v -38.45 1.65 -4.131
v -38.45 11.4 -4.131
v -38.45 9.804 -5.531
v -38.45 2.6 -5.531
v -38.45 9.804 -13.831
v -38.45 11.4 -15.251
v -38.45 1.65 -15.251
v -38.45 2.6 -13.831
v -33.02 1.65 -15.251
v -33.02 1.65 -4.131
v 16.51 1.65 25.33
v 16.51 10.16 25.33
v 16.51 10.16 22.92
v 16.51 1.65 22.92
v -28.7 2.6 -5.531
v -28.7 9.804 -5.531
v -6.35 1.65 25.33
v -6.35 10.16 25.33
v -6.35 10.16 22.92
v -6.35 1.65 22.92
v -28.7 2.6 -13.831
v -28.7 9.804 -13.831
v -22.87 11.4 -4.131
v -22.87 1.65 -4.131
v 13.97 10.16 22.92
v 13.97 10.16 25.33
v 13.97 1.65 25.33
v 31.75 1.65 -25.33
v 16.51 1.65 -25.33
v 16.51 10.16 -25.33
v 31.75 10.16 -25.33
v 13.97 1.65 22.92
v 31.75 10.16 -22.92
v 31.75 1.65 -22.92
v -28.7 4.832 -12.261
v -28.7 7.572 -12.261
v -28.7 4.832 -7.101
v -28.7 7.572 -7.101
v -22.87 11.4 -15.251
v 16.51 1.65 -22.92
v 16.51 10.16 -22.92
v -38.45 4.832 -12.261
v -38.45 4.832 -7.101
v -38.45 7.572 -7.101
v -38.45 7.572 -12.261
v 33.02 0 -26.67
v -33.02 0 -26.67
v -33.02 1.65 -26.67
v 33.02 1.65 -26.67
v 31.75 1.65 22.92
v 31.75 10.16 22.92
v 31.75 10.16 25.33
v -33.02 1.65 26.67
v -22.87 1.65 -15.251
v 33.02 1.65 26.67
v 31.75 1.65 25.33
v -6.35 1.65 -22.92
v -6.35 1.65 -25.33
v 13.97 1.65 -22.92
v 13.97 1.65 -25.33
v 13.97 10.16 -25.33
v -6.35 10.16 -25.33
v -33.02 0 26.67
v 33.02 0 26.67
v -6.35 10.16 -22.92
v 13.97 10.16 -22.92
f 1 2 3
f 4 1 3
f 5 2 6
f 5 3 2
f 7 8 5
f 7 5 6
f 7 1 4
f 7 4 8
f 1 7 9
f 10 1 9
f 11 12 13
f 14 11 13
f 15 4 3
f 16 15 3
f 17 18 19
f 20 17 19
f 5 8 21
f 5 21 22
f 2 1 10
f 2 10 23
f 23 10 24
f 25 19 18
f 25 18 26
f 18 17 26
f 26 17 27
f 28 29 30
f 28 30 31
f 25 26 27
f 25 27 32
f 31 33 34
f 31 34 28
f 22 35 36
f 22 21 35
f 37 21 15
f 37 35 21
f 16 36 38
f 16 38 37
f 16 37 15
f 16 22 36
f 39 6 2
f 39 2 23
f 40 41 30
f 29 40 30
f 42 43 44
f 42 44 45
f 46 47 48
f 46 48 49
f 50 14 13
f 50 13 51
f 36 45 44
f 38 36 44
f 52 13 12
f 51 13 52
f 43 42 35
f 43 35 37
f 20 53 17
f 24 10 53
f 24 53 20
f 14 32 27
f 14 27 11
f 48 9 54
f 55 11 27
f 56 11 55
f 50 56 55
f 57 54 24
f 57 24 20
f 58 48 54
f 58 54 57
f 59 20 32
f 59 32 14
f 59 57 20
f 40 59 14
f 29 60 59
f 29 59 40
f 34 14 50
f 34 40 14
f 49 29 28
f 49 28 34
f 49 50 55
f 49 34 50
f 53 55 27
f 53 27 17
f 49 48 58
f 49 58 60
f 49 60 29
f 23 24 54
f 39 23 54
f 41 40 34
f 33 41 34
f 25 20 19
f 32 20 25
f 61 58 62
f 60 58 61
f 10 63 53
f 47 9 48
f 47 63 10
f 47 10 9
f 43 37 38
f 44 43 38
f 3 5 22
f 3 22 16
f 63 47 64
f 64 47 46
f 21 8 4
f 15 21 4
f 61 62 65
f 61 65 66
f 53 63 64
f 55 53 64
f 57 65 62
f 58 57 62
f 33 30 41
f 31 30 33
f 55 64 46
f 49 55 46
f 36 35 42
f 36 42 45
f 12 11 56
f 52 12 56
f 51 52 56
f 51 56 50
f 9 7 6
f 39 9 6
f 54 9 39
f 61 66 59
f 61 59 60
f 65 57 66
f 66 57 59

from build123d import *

# Parameters (mm, degrees)
SKETCH2_W           = 66.04
SKETCH2_H           = 53.34
BOSS_EXTRUDE1_DEPTH = 1.65
SKETCH3_W           = 15.58
SKETCH3_H           = 11.12
BOSS_EXTRUDE2_DEPTH = 9.75
SKETCH4_W           = 8.3
SKETCH4_H           = 7.204134494
SKETCH4_W_2         = 5.16
SKETCH4_H_2         = 2.74
CUT_EXTRUDE1_DEPTH  = 9.75
SKETCH5_W           = 15.24
SKETCH5_H           = 2.41
SKETCH5_W_2         = 20.32
BOSS_EXTRUDE3_DEPTH = 8.51


with BuildPart() as part:
    # Sketch2 → Boss-Extrude1 (new body)
    with BuildSketch(Plane(origin=(0, 0, 0), x_dir=(1, 0, 0), z_dir=(0, 1, 0))):
        Rectangle(SKETCH2_W, SKETCH2_H)
    extrude(amount=BOSS_EXTRUDE1_DEPTH)

    # Sketch3 → Boss-Extrude2 (add)
    with BuildSketch(Plane(origin=(0, 1.65, 0), x_dir=(1, 0, 0), z_dir=(0, 1, 0))):
        with Locations((-30.66, 9.691373861)):
            Rectangle(SKETCH3_W, SKETCH3_H)
    extrude(amount=BOSS_EXTRUDE2_DEPTH)

    # Sketch4 → Cut-Extrude1 (cut)
    with BuildSketch(Plane.ZY.offset(38.45)):
        with Locations((-9.681373861, 6.202067247)):
            Rectangle(SKETCH4_W, SKETCH4_H)
        with Locations((-9.681373861, 6.202067247)):
            Rectangle(SKETCH4_W_2, SKETCH4_H_2, mode=Mode.SUBTRACT)
    extrude(amount=-CUT_EXTRUDE1_DEPTH, mode=Mode.SUBTRACT)

    # Sketch5 → Boss-Extrude3 (add)
    with BuildSketch(Plane(origin=(0, 1.65, 0), x_dir=(1, 0, 0), z_dir=(0, 1, 0))):
        with Locations((24.13, -24.125)):
            Rectangle(SKETCH5_W, SKETCH5_H)
        with Locations((3.81, -24.125)):
            Rectangle(SKETCH5_W_2, SKETCH5_H)
        with Locations((24.13, 24.125)):
            Rectangle(SKETCH5_W, SKETCH5_H)
        with Locations((3.81, 24.125)):
            Rectangle(SKETCH5_W_2, SKETCH5_H)
    extrude(amount=BOSS_EXTRUDE3_DEPTH)


solid = part.part
